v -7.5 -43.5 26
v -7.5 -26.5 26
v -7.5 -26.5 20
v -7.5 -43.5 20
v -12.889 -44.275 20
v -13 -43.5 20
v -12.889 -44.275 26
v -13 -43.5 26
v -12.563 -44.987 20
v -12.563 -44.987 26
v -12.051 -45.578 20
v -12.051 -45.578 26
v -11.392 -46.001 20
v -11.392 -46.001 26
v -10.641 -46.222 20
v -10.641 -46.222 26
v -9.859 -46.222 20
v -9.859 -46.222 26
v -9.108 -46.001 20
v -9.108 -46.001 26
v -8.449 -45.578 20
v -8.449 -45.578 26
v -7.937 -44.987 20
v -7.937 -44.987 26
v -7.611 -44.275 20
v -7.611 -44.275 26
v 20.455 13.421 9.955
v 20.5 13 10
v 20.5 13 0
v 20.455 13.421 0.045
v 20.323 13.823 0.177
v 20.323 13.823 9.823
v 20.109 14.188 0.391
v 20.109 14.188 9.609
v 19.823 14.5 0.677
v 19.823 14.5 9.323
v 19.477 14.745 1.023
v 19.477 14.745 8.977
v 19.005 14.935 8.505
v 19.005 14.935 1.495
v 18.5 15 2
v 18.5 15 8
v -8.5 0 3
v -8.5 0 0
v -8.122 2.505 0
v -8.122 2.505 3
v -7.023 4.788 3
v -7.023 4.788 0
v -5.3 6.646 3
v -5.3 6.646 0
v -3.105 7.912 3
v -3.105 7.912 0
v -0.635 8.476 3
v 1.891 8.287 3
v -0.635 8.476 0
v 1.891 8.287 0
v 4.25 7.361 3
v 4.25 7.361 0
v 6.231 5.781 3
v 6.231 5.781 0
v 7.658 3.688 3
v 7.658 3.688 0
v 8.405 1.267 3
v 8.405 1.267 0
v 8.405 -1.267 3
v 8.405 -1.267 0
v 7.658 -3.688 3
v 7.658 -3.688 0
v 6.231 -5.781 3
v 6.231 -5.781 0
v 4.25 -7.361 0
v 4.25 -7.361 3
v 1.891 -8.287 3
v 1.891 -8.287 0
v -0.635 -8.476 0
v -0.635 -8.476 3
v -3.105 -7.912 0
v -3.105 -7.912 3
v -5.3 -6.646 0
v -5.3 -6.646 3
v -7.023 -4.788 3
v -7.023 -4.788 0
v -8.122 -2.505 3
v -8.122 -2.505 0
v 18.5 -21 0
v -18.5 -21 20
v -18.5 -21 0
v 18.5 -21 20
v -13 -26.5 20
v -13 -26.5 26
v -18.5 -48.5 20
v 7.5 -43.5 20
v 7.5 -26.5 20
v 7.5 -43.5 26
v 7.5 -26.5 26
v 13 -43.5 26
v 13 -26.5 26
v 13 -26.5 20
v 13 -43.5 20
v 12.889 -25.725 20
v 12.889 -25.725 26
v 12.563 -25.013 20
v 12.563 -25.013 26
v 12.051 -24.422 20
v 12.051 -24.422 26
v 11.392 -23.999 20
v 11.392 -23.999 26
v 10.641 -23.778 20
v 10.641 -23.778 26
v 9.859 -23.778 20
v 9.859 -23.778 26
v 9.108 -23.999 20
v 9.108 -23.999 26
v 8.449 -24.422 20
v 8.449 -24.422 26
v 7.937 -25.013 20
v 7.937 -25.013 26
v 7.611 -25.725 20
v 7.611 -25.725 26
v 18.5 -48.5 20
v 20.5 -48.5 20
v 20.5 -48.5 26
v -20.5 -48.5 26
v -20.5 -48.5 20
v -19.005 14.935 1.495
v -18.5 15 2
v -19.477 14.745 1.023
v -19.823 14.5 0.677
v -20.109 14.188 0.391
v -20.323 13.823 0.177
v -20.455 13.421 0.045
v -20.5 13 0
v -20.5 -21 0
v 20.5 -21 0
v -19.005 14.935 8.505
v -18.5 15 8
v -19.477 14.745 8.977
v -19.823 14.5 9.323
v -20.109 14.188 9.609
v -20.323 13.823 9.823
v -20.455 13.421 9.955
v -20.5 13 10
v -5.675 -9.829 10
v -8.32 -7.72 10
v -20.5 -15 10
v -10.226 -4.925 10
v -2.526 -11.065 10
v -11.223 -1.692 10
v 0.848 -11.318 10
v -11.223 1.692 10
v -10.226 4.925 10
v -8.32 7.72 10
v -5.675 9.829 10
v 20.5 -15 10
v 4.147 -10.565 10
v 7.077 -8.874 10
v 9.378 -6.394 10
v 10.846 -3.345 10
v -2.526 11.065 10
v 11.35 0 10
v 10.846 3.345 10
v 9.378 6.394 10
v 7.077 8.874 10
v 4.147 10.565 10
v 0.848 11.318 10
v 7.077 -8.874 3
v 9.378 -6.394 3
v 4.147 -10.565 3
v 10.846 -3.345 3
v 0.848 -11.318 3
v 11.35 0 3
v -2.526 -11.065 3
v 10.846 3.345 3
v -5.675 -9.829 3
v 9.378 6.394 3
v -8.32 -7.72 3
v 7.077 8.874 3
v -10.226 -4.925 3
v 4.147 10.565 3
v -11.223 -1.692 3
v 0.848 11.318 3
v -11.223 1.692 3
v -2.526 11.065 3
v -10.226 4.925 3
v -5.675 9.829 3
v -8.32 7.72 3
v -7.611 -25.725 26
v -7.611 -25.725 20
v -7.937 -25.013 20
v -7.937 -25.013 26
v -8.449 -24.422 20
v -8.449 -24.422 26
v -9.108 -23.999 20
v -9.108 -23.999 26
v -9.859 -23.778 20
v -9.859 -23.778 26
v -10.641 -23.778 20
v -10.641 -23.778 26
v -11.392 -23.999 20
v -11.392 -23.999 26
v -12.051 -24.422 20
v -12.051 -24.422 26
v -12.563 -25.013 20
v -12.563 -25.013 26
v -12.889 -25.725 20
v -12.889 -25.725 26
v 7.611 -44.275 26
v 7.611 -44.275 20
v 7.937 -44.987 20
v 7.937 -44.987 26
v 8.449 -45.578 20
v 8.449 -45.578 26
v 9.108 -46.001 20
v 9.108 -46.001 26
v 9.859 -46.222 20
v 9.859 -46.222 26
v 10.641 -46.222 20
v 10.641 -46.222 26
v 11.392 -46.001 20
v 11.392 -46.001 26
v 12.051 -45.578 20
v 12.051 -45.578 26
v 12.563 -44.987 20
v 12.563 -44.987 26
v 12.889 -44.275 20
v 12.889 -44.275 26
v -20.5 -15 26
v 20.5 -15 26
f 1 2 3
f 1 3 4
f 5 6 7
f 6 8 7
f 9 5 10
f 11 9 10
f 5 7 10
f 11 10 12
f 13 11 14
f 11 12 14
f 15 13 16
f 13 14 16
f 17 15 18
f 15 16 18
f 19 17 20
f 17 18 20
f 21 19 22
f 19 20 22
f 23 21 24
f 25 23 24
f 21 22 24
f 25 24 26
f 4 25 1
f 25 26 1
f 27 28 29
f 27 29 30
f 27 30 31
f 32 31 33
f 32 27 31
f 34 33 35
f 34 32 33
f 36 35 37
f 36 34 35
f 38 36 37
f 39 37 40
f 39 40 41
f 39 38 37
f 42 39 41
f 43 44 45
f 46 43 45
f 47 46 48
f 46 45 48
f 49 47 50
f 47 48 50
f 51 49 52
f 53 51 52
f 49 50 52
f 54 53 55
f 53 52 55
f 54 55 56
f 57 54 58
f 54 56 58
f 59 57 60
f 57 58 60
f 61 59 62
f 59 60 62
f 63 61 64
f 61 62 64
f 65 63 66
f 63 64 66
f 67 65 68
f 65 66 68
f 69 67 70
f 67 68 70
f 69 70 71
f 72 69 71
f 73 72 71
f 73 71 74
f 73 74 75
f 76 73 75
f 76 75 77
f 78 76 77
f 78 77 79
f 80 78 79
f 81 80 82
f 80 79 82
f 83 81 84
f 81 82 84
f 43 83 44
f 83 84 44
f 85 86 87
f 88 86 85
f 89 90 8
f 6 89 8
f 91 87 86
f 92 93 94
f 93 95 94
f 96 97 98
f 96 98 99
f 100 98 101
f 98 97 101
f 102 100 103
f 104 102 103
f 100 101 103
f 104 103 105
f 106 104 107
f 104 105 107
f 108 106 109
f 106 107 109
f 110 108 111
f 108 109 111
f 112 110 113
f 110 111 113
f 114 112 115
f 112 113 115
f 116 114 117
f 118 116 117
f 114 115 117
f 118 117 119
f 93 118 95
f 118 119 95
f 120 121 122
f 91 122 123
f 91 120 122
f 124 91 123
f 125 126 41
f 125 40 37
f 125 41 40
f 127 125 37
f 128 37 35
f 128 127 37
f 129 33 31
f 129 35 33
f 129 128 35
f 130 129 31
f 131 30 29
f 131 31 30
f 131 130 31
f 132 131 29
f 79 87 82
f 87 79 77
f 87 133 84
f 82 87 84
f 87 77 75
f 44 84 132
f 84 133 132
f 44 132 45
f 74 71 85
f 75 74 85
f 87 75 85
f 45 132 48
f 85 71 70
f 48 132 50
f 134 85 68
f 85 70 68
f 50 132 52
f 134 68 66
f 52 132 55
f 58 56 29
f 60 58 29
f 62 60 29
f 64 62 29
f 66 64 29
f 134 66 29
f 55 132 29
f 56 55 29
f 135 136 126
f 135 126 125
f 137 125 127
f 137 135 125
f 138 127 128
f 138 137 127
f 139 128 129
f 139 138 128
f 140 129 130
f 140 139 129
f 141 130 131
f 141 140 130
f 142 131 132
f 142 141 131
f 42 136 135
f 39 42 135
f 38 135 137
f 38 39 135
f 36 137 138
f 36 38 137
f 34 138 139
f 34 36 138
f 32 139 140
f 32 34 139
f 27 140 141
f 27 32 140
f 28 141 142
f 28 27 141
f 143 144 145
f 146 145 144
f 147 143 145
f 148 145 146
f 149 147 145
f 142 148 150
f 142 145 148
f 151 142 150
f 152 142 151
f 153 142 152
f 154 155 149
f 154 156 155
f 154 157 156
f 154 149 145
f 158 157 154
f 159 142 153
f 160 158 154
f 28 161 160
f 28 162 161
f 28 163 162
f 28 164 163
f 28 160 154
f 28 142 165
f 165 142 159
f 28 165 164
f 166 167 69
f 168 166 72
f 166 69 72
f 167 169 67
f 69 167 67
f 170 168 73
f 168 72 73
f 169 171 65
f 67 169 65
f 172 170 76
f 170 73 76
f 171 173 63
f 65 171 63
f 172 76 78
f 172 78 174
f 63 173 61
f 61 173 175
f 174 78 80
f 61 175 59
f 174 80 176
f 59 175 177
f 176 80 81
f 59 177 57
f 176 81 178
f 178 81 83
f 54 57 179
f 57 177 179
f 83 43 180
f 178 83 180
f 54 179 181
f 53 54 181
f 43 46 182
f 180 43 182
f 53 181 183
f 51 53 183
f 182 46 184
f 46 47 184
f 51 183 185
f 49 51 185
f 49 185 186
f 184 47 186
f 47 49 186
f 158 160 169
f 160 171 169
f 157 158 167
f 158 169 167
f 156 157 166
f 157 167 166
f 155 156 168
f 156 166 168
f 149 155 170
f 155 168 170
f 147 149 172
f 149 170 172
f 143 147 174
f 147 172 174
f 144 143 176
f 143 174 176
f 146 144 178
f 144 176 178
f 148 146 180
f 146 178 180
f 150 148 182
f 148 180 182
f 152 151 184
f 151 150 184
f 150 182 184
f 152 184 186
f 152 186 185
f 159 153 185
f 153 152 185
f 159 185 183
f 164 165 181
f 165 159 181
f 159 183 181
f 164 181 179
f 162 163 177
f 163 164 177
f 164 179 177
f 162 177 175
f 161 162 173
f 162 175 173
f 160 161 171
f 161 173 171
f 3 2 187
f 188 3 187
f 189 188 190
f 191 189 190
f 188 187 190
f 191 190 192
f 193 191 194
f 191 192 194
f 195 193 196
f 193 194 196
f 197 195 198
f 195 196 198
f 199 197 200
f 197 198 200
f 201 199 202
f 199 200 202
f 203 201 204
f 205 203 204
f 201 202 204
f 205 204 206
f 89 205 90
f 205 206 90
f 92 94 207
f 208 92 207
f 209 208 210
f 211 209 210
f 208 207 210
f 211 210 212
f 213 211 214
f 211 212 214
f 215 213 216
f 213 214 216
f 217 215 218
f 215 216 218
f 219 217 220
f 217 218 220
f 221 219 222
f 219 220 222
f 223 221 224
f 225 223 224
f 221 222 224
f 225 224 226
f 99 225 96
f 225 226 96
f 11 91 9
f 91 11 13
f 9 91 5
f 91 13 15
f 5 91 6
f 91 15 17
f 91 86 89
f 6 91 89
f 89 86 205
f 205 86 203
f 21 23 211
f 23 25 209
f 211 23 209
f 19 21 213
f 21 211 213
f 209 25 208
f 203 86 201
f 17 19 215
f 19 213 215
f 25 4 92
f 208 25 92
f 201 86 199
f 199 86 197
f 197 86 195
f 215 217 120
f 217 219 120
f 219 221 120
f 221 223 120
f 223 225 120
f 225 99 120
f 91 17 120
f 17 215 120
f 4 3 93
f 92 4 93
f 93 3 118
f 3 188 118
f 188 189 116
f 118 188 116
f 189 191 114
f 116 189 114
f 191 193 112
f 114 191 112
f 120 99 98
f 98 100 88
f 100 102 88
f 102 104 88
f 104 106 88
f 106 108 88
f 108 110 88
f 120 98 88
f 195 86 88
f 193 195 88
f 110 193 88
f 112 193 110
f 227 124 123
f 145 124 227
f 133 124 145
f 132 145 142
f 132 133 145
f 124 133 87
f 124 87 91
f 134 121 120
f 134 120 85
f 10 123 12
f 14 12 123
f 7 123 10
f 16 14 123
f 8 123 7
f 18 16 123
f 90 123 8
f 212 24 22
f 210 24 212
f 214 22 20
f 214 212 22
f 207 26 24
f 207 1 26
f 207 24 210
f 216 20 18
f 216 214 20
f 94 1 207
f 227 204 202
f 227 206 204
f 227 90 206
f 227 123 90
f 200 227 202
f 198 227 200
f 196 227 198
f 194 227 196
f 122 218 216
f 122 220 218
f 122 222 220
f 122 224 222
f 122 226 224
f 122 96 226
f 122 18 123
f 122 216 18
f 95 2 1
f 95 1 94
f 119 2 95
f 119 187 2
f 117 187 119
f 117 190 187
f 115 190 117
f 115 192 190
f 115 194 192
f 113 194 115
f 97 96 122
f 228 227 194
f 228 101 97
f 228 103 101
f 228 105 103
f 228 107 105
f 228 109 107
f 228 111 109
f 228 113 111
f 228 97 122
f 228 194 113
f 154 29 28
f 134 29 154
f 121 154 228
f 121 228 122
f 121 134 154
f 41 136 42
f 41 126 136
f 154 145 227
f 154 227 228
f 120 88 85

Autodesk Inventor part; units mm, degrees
ref_plane "YZ Plane" through (0, 0, 0) normal (1, 0, 0) x (0, 1, 0)
ref_plane "XZ Plane" through (0, 0, 0) normal (0, 1, 0) x (-1, 0, 0)
ref_plane "XY Plane" through (0, 0, 0) normal (0, 0, 1) x (1, 0, 0)
sketch "Sketch1" plane through (0, 0, 0) normal (0, 0, 1) x (1, 0, 0)
  line L0 (-20.5, 15) -> (20.5, 15)
  line L1 (20.5, 15) -> (20.5, -15)
  line L2 (20.5, -15) -> (-20.5, -15)
  line L3 (-20.5, -15) -> (-20.5, 15)
  line L4 (-20.5, 15) -> (20.5, -15) construction
  line L5 (20.5, 15) -> (-20.5, -15) construction
  circle A0 centre (0, 0) radius 11.35
  line L6 (16.5, 15) -> (16.5, -15)
  dimension "d0" = 41
  dimension "d1" = 30
  dimension "d2" = 22.7
  dimension "d4" = 4
extrude "Extrusion3" add sketch "Sketch1" along normal blind 10
sketch "Sketch3" plane through (0, 0, 0) normal (0, 0, -1) x (-1, 0, 0)
  circle A0 centre (0, 0) radius 11.35
  circle A1 centre (0, 0) radius 11.35 projected
  circle A2 centre (0, 0) radius 8.5
  dimension "d18" = 17
extrude "Extrusion4" add sketch "Sketch3" against normal blind 3
sketch "Sketch4" plane through (-20.5, -15, 0) normal (0, -1, 0) x (1, 0, 0)
  line L0 (0, 0) -> (0, 10) projected
  line L1 (0, 0) -> (41, 0)
  line L2 (41, 0) -> (41, 20)
  line L3 (41, 20) -> (0, 20)
  line L4 (0, 20) -> (0, 0)
  point P0 (20.5, 0)
  dimension "d21" = 20
  dimension "d22" = 41
extrude "Extrusion5" add sketch "Sketch4" along normal blind 6
sketch "Sketch5" plane through (-20.5, -15, 20) normal (0, 0, 1) x (1, 0, 0)
  line L0 (0, 30) -> (0, 0) projected
  line L1 (0, 0) -> (41, 0)
  line L2 (41, 0) -> (41, -33.5)
  line L3 (41, -33.5) -> (0, -33.5)
  line L4 (0, -33.5) -> (0, 0)
  point P0 (20.5, 15)
  dimension "d25" = 33.5
  dimension "d69" = 41
extrude "Extrusion6" add sketch "Sketch5" along normal blind 6
sketch "Sketch13" plane through (20.5, 15, 10) normal (1, 0, 0) x (0, 0, -1)
  line L0 (-10, -63.5) -> (-16, -63.5) projected
  line L1 (-10, -63.5) -> (-10, -36) projected
  line L2 (-16, -63.5) -> (-10, -63.5)
  line L3 (-10, -63.5) -> (10, -36)
  line L4 (10, -36) -> (10, -30)
  line L5 (0, 0) -> (0, -30) projected
  line L6 (10, -30) -> (-16, -30)
  line L7 (-16, -30) -> (-16, -63.5) projected
  line L8 (-16, -30) -> (-16, -63.5)
  point P0 (10, -15)
  point P1 (-16, -56.5)
extrude "Extrusion10" add sketch "Sketch13" against normal blind 2
ref_plane "Work Plane1" through (0, 15, 0) normal (-1, 0, 0) x (0, 0, 1)
mirror "Mirror1" about plane through (0, 15, 0) normal (-1, 0, 0) of "Extrusion10"
fillet "Fillet2" radius 2 4 edges at (20.5, 15, 5) (-20.5, 15, 5) (0, 15, 10) (0, 15, 0)
sketch "Sketch15" plane through (-20.5, -15, 26) normal (0, 0, 1) x (1, 0, 0)
  arc A0 (13, -11.5) -> (7.5, -11.5) centre (10.25, -11.5) ccw
  line L0 (2, -33.5) -> (39, -33.5) projected
  line L1 (0, -2) -> (0, -31.5) projected
  arc A1 (7.5, -28.5) -> (13, -28.5) centre (10.25, -28.5) ccw
  line L2 (7.5, -11.5) -> (7.5, -28.5)
  line L3 (13, -11.5) -> (13, -28.5)
  line L4 (20.5, -33.5) -> (20.5, -2)
  arc A2 (33.5, -11.5) -> (28, -11.5) centre (30.75, -11.5) ccw
  arc A3 (28, -28.5) -> (33.5, -28.5) centre (30.75, -28.5) ccw
  line L5 (33.5, -11.5) -> (33.5, -28.5)
  line L6 (28, -11.5) -> (28, -28.5)
  point P0 (20.5, 15)
  dimension "d74" = 5.5
  dimension "d75" = 22
  dimension "d76" = 10.25
  dimension "d77" = 5.5
  dimension "d78" = 5
  dimension "d79" = 10.25
extrude "Extrusion11" cut sketch "Sketch15" against normal through all
properties part number "Estrutura - Rolamento Esquerdo"
